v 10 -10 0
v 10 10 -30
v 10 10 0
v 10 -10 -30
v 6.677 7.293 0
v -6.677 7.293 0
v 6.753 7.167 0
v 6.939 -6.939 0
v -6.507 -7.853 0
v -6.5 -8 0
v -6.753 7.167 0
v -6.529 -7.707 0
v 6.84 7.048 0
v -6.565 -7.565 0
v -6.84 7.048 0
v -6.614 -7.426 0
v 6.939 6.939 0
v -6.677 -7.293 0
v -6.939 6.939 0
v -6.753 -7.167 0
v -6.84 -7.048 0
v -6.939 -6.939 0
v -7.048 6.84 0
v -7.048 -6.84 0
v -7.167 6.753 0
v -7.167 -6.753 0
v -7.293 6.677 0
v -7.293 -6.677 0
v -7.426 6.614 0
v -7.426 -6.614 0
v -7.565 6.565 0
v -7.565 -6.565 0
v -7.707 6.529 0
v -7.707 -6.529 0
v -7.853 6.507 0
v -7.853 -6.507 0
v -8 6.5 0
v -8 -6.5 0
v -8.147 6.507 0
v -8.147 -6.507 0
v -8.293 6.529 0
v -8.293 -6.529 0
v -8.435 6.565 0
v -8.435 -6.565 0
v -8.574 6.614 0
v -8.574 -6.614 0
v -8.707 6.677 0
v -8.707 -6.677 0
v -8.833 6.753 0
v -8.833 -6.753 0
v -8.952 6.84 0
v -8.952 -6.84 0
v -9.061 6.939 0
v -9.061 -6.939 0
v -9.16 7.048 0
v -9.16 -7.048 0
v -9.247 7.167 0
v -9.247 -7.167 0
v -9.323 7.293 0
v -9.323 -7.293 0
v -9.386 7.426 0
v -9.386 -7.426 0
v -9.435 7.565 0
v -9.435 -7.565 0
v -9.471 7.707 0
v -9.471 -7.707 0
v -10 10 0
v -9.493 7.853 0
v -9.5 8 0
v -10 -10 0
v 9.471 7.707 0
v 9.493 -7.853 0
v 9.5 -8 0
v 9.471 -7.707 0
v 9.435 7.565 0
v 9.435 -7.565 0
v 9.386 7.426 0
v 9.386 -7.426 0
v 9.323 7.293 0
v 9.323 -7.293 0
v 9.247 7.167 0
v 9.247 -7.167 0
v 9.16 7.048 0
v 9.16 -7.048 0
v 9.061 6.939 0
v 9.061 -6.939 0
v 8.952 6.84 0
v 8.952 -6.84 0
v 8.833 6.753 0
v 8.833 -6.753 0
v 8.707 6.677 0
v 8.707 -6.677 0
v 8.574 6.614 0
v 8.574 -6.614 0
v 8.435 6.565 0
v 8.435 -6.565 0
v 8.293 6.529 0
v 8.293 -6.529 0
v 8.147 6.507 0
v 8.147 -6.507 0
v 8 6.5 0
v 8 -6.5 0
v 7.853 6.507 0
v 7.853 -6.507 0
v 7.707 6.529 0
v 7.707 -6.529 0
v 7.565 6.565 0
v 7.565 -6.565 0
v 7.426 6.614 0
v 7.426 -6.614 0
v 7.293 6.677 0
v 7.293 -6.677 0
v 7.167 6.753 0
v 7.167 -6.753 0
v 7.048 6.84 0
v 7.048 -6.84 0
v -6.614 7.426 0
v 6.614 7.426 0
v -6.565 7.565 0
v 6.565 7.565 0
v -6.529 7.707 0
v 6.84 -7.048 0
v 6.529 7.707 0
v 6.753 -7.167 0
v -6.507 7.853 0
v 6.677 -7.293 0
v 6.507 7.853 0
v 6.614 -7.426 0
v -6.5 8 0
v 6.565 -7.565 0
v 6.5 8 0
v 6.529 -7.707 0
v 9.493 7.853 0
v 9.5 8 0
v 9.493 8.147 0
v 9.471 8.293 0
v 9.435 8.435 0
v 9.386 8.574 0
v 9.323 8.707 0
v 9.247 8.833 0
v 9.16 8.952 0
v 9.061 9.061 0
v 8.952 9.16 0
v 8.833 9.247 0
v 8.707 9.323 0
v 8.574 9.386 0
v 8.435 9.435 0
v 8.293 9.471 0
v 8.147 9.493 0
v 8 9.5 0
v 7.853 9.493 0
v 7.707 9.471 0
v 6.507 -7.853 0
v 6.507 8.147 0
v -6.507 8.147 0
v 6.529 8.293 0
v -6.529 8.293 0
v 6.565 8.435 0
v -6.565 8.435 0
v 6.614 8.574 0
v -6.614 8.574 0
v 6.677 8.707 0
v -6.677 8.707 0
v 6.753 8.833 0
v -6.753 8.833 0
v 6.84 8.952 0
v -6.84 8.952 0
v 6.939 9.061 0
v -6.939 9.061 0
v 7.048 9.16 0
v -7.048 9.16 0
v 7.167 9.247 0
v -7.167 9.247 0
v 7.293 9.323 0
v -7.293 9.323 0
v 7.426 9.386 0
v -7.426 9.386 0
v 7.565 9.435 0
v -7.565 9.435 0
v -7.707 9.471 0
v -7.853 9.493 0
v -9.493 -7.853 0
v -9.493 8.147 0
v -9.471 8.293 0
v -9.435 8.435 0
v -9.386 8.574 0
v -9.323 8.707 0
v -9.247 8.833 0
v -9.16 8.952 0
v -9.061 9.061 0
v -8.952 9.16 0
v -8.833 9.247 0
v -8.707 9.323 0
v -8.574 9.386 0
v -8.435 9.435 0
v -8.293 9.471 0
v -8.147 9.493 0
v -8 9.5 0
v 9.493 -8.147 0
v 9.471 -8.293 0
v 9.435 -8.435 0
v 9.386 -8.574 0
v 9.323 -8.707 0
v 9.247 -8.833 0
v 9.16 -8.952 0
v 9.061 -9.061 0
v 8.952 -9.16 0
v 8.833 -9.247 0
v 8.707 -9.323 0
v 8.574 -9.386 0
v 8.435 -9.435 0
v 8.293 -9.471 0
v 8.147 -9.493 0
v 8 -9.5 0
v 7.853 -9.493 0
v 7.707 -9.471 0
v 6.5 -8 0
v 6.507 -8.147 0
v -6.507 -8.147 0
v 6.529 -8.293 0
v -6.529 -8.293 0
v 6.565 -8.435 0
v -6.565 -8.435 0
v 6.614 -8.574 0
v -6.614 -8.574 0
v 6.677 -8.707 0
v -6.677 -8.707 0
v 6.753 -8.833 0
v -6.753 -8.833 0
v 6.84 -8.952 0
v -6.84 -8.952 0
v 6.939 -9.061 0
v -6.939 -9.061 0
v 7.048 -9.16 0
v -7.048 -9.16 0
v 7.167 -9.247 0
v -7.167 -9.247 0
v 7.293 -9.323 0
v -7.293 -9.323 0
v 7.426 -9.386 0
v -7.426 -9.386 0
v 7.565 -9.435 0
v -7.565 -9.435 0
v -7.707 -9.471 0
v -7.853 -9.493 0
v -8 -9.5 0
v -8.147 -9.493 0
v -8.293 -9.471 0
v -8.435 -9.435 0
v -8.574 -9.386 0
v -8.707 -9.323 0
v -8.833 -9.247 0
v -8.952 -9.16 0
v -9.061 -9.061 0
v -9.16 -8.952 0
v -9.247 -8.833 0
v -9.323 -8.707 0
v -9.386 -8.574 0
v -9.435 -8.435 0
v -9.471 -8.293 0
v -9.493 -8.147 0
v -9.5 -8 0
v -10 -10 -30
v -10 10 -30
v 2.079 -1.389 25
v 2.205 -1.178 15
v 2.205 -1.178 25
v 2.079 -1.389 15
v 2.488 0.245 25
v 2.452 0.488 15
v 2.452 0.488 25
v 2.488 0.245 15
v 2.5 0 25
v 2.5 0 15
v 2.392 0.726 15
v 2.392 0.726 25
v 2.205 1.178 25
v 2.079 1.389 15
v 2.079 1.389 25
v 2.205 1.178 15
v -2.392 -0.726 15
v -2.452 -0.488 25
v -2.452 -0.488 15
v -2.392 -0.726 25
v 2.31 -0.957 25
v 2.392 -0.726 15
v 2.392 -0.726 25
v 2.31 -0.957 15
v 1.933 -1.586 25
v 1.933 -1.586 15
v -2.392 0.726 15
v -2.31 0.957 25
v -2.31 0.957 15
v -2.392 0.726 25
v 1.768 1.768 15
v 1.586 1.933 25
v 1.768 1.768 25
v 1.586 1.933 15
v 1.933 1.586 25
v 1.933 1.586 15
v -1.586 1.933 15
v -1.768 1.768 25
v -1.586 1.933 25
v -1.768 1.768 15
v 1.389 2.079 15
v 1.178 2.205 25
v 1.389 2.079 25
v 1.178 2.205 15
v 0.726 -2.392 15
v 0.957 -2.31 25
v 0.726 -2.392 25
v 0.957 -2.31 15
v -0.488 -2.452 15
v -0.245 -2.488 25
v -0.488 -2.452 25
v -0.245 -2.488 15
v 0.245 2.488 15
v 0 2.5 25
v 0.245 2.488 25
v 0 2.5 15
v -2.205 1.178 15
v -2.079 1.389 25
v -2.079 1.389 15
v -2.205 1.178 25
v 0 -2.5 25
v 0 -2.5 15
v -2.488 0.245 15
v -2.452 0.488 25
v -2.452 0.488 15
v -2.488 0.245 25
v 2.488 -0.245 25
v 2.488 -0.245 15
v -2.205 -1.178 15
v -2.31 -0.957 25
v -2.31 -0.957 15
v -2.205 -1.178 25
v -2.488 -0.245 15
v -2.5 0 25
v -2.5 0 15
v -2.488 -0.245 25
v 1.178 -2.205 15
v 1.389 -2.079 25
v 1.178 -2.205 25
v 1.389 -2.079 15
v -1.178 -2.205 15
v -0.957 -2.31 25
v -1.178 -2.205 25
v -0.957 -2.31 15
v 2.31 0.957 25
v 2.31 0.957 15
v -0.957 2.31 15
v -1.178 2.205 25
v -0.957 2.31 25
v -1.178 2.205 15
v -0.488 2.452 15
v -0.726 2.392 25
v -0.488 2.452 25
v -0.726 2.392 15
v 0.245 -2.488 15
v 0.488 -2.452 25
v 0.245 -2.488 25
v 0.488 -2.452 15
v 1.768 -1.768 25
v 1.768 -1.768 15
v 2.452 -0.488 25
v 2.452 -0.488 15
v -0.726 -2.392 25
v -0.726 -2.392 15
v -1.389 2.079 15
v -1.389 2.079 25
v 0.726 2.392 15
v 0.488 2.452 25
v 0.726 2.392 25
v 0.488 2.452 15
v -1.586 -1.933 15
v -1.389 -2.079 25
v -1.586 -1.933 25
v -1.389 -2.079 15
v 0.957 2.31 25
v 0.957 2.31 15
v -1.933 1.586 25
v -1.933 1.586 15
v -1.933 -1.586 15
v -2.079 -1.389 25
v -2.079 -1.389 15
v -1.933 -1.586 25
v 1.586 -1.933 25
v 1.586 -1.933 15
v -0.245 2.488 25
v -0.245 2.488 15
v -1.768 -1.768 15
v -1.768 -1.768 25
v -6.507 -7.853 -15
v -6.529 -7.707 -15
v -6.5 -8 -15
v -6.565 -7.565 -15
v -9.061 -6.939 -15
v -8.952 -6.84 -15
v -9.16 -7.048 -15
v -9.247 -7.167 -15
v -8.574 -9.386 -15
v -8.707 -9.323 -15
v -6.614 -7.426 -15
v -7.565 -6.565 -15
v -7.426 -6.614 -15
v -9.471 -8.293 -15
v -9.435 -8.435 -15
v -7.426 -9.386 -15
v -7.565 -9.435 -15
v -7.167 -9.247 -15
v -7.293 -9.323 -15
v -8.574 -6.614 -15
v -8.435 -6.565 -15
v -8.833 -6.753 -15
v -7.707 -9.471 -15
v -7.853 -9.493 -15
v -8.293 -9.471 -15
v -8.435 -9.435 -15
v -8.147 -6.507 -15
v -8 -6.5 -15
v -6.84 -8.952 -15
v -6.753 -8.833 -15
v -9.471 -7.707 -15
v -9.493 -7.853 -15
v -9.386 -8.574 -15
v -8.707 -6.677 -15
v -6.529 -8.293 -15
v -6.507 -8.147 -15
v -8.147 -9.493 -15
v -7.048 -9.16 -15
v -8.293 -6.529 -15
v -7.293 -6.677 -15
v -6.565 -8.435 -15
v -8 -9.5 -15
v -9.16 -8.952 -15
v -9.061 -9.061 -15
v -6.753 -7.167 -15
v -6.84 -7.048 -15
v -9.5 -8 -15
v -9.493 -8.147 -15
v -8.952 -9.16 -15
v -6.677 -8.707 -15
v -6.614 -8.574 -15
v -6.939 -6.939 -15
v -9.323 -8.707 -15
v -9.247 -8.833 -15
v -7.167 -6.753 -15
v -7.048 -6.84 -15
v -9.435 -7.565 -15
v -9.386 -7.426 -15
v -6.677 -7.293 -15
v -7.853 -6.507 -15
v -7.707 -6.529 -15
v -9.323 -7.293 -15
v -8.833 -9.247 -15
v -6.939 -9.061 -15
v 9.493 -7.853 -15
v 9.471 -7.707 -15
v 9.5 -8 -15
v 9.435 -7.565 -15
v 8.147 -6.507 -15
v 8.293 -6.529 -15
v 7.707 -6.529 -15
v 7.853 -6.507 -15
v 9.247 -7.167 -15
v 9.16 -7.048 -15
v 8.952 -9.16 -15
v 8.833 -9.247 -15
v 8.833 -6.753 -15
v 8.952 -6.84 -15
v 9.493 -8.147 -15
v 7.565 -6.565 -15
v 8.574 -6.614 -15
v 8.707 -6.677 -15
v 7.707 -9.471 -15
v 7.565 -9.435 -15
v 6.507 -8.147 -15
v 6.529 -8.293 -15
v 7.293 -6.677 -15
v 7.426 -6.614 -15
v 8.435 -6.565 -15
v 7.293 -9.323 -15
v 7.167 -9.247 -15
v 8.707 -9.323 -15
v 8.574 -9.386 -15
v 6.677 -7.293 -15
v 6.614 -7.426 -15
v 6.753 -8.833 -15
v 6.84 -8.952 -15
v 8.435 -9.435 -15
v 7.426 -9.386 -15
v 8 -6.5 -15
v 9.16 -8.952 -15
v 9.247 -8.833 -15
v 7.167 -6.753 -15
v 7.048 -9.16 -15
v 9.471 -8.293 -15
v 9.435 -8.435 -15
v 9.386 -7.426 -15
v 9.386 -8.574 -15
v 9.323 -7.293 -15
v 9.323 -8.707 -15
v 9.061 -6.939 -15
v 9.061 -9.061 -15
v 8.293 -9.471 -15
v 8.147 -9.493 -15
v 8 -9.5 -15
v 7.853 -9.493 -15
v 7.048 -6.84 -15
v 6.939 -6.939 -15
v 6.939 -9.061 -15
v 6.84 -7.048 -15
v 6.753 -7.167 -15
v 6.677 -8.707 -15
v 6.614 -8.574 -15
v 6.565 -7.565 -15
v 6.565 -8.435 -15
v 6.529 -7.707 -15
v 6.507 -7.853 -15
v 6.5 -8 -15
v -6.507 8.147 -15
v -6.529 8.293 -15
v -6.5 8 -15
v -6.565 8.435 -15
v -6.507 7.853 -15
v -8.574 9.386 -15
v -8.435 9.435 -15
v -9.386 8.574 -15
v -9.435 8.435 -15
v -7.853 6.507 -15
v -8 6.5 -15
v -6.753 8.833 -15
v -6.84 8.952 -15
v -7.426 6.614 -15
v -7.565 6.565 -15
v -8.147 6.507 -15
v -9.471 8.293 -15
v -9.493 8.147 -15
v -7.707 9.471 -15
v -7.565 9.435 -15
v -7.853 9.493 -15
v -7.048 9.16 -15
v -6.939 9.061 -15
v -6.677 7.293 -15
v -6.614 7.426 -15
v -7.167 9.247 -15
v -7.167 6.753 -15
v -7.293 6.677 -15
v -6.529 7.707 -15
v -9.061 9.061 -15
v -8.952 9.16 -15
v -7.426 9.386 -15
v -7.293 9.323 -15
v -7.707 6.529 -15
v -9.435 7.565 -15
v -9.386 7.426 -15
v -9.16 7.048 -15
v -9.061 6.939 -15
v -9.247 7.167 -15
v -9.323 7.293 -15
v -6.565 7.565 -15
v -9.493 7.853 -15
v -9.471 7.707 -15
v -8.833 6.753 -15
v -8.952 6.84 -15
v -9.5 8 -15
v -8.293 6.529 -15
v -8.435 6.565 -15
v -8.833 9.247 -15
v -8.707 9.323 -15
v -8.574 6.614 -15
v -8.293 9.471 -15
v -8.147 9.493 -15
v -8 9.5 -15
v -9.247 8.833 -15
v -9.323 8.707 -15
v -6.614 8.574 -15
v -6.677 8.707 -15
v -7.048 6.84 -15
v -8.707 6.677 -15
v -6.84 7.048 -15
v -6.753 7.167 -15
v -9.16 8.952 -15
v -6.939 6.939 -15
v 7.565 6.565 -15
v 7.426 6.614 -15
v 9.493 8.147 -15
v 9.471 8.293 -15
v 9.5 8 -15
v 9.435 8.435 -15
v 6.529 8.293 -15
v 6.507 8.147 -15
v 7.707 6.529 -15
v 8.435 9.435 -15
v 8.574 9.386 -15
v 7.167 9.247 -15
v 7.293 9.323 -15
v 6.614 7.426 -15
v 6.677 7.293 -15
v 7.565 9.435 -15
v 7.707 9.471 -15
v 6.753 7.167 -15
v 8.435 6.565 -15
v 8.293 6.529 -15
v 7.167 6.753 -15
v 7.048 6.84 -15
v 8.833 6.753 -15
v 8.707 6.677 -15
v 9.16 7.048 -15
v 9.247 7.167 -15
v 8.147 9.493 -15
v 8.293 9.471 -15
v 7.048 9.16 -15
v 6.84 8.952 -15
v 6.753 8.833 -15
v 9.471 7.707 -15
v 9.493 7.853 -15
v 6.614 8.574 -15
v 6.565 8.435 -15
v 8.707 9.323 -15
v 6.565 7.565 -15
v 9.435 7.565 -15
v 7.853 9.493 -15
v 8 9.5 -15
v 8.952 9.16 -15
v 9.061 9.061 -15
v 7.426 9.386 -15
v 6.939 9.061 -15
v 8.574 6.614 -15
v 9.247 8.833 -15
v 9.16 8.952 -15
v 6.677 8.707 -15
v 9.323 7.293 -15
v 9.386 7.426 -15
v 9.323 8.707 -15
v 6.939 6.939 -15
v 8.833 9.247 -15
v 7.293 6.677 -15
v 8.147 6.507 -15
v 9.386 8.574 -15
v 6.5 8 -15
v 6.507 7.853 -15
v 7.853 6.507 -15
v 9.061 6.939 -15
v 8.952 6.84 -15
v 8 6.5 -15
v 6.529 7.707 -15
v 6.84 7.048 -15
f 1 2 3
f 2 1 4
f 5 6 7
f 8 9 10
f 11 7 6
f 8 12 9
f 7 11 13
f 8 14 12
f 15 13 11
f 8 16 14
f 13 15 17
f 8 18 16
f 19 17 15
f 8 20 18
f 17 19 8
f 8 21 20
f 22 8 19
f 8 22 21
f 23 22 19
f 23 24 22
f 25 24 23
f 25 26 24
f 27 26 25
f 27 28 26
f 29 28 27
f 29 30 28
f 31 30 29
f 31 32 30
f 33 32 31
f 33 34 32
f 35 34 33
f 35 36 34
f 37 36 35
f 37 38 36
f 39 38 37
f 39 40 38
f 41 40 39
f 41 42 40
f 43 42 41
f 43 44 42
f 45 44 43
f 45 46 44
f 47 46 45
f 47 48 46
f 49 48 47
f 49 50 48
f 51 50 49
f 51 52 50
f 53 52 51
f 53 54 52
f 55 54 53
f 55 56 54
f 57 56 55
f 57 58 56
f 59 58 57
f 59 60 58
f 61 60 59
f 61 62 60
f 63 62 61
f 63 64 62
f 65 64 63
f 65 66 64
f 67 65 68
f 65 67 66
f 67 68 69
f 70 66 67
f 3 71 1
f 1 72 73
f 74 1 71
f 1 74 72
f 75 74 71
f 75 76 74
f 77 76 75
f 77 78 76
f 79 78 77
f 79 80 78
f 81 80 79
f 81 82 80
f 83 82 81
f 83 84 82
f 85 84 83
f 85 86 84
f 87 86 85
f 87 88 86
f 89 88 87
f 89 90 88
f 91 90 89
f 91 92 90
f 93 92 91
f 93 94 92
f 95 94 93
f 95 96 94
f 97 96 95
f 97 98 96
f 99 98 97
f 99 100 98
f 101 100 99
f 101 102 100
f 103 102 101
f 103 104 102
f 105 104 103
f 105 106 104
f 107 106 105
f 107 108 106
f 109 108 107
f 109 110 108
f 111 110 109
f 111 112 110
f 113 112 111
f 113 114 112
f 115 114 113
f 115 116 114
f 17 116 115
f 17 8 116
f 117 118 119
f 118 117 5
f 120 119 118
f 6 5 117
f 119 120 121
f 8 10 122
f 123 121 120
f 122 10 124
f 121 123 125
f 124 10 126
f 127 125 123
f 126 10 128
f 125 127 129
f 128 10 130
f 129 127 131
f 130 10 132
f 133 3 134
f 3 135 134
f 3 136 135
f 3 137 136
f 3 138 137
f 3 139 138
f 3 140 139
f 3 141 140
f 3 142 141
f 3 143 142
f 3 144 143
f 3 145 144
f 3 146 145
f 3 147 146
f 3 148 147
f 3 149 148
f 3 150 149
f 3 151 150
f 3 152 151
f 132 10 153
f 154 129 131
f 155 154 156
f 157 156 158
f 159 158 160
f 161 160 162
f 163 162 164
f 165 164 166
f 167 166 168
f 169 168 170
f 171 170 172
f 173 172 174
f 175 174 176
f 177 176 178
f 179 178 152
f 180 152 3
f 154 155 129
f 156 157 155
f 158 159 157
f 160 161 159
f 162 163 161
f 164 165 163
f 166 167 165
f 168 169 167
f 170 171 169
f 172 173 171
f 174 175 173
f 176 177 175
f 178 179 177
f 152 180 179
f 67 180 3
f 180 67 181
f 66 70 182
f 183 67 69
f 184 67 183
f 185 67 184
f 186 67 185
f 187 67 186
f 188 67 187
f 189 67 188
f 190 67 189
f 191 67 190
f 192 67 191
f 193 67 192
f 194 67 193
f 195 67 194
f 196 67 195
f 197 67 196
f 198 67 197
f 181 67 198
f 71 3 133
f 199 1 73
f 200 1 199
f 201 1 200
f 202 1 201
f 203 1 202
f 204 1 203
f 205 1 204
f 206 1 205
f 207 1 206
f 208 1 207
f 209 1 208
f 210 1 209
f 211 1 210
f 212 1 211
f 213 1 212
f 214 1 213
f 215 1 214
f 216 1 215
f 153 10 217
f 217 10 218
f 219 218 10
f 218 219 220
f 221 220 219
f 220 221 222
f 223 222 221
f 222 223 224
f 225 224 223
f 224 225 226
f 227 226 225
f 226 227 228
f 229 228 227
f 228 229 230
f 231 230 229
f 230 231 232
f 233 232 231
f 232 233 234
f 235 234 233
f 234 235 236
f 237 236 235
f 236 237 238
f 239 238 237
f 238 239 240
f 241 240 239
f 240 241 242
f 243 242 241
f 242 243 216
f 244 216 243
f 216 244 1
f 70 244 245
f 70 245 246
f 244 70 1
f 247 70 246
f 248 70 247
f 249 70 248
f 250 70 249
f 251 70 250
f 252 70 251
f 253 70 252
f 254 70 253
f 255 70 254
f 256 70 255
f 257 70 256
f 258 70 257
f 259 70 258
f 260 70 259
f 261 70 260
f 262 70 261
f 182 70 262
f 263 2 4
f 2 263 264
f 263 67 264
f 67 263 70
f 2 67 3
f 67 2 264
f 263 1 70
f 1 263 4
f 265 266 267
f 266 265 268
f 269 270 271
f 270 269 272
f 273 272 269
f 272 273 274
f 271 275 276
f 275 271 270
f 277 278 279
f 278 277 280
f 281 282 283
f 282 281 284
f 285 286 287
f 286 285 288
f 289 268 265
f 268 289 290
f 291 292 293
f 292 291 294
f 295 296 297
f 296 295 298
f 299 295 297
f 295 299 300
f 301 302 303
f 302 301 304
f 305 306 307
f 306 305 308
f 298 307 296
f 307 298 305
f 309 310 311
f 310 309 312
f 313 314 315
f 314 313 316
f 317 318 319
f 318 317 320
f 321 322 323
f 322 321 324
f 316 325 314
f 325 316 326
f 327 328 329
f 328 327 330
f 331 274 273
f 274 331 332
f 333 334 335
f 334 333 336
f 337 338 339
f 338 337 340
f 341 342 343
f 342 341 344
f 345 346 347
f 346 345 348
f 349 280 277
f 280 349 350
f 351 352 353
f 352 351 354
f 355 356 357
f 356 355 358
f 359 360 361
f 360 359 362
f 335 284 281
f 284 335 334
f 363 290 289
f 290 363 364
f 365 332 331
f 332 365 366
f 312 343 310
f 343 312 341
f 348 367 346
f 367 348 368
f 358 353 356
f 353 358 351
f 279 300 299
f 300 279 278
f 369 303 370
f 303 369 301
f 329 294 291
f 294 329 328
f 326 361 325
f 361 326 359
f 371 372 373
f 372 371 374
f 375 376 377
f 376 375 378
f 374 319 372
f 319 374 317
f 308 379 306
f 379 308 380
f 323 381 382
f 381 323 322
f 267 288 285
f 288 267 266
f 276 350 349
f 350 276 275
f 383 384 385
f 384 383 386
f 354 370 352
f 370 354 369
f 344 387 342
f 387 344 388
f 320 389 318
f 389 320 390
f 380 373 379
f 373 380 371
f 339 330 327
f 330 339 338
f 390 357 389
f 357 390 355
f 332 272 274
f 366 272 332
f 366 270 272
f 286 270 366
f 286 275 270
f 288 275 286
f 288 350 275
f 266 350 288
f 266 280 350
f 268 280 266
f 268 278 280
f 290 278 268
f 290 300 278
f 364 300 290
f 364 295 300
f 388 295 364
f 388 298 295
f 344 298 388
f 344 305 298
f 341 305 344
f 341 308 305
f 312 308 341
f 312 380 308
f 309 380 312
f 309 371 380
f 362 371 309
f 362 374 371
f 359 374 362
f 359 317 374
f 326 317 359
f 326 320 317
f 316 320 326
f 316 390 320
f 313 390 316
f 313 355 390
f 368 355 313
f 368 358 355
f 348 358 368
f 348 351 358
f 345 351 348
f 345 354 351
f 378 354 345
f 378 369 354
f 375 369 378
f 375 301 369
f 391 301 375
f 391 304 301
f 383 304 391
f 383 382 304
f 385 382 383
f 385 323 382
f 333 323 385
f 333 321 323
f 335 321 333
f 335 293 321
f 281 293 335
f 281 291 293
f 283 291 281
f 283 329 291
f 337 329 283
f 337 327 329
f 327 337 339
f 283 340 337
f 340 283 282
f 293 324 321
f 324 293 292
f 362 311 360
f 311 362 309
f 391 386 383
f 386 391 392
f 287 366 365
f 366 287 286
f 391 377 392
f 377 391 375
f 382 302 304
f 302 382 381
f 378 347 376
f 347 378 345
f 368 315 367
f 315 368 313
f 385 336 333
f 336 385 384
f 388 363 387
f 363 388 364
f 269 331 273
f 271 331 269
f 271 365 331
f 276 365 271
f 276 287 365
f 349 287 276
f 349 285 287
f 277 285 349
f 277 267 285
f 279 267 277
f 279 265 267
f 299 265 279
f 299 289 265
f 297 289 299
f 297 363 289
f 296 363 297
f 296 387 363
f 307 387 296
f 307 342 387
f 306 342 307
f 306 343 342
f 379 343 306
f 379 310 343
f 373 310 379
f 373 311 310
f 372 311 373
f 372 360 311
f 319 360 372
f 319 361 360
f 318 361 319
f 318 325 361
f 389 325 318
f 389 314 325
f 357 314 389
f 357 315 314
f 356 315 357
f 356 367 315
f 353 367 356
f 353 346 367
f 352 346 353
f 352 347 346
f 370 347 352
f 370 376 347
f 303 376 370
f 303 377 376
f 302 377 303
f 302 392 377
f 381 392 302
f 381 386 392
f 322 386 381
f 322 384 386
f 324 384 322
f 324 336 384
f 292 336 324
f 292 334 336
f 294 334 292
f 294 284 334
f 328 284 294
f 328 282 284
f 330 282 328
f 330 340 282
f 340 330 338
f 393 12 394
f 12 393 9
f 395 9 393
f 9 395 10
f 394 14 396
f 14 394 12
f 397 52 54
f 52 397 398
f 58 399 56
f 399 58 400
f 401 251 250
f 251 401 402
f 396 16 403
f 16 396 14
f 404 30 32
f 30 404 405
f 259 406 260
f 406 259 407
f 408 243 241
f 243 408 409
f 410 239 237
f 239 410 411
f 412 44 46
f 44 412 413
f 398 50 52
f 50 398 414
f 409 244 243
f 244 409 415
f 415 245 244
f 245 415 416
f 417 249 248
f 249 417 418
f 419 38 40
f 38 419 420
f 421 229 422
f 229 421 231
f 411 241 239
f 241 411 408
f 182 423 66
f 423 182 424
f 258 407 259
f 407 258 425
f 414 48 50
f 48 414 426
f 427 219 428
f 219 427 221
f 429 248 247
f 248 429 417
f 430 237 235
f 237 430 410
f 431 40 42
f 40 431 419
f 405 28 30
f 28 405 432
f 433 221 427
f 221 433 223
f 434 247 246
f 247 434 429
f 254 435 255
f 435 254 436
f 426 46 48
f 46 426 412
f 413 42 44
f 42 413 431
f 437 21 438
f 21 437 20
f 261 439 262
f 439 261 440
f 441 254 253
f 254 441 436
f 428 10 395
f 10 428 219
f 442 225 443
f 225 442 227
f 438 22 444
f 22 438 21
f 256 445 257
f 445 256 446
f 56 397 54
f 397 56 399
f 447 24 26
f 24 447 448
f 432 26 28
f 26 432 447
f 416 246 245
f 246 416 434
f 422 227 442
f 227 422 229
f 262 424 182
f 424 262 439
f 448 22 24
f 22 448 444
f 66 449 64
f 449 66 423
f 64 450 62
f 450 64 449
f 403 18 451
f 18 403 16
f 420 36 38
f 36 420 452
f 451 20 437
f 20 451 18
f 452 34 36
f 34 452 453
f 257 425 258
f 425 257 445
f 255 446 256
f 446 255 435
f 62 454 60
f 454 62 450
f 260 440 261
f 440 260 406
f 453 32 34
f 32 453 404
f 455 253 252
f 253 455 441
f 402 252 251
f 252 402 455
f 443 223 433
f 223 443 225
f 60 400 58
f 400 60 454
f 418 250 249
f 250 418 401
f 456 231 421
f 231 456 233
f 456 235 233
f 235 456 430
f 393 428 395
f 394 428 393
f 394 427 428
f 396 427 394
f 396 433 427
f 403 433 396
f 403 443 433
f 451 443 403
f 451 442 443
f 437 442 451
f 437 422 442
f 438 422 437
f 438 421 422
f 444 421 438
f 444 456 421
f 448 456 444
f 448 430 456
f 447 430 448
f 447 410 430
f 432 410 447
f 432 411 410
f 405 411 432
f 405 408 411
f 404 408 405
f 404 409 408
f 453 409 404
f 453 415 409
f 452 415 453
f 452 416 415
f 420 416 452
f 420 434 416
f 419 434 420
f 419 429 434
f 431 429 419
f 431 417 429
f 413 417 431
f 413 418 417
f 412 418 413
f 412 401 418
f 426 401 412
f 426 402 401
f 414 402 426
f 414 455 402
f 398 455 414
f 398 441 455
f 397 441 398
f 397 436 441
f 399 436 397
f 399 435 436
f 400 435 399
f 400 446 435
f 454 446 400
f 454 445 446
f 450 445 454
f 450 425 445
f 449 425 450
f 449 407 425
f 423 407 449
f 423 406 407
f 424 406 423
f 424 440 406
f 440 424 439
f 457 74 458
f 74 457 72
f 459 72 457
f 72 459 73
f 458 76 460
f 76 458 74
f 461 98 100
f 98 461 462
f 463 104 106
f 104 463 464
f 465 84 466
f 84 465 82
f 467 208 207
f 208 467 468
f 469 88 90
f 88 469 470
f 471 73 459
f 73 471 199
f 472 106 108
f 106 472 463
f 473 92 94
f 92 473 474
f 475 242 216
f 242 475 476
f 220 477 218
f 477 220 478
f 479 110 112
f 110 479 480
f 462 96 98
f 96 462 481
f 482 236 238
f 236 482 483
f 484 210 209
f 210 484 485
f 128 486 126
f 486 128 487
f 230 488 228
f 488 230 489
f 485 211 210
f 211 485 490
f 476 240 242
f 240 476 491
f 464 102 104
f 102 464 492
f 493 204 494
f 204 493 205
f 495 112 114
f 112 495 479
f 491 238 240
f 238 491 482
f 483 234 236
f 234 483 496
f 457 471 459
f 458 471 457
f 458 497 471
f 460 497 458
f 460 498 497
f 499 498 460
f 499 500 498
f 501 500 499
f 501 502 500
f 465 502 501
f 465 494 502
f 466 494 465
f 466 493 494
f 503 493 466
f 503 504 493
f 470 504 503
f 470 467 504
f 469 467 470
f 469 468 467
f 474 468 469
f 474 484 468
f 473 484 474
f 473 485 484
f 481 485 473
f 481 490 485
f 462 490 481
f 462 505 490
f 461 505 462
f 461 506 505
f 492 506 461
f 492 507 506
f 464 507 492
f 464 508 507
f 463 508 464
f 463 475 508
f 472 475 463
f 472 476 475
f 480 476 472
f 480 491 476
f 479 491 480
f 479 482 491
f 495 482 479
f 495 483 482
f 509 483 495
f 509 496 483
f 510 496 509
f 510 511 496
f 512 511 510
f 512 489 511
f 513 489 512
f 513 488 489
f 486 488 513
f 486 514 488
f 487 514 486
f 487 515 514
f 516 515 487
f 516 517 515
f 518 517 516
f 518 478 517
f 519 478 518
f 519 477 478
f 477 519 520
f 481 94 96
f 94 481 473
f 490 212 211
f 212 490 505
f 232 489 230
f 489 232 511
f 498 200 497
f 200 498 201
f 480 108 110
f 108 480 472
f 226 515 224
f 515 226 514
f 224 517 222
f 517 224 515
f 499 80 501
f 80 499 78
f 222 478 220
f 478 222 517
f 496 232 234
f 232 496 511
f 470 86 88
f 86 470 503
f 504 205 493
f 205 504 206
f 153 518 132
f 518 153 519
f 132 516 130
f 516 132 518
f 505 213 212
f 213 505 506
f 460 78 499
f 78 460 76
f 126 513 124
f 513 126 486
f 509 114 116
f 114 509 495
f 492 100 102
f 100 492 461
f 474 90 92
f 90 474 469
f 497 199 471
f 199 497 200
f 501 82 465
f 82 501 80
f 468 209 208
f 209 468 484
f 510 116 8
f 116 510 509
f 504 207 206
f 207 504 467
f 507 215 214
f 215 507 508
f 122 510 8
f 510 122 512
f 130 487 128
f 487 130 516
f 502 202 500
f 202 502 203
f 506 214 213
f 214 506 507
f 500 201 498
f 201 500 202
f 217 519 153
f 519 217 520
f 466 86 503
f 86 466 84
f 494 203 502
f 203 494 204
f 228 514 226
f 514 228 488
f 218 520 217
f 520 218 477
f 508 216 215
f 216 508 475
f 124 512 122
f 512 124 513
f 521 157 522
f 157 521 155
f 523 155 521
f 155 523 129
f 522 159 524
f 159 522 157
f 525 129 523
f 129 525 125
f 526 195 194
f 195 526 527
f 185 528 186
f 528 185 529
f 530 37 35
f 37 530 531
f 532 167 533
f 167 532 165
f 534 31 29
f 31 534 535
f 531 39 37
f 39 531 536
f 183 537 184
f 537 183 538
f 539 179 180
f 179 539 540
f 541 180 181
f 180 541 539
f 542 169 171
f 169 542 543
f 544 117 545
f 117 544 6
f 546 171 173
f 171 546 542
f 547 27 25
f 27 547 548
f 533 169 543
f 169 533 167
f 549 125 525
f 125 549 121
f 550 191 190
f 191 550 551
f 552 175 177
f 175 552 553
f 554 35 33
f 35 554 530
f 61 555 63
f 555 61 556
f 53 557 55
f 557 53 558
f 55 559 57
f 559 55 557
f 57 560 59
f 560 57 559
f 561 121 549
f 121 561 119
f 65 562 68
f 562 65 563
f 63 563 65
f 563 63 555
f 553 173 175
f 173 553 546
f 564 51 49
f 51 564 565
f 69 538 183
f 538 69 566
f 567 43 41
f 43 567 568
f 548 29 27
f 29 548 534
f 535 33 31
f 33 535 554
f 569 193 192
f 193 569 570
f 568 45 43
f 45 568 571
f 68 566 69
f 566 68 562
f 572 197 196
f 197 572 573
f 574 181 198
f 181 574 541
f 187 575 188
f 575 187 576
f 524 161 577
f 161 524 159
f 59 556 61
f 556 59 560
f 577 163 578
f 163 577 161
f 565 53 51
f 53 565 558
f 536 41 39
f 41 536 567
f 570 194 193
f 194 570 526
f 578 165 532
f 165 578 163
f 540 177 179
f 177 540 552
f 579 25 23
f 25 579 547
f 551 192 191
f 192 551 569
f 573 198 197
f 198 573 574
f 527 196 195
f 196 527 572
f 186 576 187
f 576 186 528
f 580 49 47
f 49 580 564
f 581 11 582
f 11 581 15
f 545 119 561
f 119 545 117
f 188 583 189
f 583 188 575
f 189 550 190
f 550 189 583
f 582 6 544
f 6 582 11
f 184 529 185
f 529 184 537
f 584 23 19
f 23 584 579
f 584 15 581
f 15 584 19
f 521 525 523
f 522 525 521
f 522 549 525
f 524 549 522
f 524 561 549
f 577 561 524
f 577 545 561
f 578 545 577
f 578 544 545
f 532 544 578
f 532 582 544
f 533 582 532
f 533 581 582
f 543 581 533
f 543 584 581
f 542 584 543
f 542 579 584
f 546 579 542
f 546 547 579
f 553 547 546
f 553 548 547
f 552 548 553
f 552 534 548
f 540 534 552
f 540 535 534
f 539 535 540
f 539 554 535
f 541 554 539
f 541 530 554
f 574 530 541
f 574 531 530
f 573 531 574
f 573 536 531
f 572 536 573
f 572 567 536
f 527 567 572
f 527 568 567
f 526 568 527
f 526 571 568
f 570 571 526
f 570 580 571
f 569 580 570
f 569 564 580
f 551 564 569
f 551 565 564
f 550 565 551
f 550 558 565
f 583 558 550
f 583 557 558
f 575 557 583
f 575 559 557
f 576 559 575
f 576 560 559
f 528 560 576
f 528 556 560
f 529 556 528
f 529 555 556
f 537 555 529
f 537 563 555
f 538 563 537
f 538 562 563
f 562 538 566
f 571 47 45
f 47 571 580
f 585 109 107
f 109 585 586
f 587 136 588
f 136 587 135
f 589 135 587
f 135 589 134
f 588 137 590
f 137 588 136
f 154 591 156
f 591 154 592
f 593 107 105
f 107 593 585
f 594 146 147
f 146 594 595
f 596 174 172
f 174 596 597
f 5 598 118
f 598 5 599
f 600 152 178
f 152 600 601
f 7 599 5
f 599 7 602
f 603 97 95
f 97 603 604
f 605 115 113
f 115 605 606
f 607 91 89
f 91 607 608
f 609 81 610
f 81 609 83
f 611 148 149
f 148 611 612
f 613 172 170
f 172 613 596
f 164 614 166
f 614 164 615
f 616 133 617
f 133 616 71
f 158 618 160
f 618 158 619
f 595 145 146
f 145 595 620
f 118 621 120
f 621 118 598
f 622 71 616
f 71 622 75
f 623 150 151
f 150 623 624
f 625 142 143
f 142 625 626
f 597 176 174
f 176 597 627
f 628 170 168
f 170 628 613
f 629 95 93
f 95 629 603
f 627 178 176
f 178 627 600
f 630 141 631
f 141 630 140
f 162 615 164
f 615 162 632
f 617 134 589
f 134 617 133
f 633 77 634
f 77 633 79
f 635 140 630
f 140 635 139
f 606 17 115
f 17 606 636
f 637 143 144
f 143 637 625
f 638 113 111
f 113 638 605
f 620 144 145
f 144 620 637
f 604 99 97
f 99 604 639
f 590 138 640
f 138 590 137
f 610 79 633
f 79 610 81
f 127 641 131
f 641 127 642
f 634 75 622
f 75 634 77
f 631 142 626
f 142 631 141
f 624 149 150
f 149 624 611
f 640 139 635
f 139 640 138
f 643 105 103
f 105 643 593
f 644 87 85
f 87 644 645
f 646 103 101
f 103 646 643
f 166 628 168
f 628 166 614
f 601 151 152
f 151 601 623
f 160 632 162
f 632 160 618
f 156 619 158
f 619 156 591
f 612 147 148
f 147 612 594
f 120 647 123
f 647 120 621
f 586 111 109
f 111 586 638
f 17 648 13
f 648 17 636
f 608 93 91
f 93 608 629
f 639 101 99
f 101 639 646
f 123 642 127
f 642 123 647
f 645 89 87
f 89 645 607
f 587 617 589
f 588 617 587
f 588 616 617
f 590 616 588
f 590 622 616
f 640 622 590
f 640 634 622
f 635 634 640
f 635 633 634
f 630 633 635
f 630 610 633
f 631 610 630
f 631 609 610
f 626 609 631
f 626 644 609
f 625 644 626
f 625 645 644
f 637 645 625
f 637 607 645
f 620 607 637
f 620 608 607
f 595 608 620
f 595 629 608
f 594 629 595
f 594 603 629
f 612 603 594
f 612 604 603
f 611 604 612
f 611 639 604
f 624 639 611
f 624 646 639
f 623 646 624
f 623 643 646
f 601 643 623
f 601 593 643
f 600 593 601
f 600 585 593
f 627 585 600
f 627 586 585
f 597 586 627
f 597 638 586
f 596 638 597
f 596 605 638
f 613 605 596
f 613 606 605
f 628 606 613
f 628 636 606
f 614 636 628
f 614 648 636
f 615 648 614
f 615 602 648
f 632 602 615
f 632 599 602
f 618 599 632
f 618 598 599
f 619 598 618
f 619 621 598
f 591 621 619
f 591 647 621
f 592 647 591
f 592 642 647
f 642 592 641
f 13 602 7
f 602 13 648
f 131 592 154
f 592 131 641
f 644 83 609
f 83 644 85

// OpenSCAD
module stepper_motor() {
    difference() {
        union() {
            // Motor body
            translate([0, 0, -15])
                cube([20, 20, 30], center=true);
            // Shaft
            translate([0, 0, 15])
                cylinder(h=10, d=5, center=false, $fn=64);
        }
        // Mounting holes
        translate([-8, -8, 0])
            cylinder(h=30, d=3, center=true, $fn=64);
        translate([8, -8, 0])
            cylinder(h=30, d=3, center=true, $fn=64);
        translate([-8, 8, 0])
            cylinder(h=30, d=3, center=true, $fn=64);
        translate([8, 8, 0])
            cylinder(h=30, d=3, center=true, $fn=64);
    }
}

stepper_motor();
